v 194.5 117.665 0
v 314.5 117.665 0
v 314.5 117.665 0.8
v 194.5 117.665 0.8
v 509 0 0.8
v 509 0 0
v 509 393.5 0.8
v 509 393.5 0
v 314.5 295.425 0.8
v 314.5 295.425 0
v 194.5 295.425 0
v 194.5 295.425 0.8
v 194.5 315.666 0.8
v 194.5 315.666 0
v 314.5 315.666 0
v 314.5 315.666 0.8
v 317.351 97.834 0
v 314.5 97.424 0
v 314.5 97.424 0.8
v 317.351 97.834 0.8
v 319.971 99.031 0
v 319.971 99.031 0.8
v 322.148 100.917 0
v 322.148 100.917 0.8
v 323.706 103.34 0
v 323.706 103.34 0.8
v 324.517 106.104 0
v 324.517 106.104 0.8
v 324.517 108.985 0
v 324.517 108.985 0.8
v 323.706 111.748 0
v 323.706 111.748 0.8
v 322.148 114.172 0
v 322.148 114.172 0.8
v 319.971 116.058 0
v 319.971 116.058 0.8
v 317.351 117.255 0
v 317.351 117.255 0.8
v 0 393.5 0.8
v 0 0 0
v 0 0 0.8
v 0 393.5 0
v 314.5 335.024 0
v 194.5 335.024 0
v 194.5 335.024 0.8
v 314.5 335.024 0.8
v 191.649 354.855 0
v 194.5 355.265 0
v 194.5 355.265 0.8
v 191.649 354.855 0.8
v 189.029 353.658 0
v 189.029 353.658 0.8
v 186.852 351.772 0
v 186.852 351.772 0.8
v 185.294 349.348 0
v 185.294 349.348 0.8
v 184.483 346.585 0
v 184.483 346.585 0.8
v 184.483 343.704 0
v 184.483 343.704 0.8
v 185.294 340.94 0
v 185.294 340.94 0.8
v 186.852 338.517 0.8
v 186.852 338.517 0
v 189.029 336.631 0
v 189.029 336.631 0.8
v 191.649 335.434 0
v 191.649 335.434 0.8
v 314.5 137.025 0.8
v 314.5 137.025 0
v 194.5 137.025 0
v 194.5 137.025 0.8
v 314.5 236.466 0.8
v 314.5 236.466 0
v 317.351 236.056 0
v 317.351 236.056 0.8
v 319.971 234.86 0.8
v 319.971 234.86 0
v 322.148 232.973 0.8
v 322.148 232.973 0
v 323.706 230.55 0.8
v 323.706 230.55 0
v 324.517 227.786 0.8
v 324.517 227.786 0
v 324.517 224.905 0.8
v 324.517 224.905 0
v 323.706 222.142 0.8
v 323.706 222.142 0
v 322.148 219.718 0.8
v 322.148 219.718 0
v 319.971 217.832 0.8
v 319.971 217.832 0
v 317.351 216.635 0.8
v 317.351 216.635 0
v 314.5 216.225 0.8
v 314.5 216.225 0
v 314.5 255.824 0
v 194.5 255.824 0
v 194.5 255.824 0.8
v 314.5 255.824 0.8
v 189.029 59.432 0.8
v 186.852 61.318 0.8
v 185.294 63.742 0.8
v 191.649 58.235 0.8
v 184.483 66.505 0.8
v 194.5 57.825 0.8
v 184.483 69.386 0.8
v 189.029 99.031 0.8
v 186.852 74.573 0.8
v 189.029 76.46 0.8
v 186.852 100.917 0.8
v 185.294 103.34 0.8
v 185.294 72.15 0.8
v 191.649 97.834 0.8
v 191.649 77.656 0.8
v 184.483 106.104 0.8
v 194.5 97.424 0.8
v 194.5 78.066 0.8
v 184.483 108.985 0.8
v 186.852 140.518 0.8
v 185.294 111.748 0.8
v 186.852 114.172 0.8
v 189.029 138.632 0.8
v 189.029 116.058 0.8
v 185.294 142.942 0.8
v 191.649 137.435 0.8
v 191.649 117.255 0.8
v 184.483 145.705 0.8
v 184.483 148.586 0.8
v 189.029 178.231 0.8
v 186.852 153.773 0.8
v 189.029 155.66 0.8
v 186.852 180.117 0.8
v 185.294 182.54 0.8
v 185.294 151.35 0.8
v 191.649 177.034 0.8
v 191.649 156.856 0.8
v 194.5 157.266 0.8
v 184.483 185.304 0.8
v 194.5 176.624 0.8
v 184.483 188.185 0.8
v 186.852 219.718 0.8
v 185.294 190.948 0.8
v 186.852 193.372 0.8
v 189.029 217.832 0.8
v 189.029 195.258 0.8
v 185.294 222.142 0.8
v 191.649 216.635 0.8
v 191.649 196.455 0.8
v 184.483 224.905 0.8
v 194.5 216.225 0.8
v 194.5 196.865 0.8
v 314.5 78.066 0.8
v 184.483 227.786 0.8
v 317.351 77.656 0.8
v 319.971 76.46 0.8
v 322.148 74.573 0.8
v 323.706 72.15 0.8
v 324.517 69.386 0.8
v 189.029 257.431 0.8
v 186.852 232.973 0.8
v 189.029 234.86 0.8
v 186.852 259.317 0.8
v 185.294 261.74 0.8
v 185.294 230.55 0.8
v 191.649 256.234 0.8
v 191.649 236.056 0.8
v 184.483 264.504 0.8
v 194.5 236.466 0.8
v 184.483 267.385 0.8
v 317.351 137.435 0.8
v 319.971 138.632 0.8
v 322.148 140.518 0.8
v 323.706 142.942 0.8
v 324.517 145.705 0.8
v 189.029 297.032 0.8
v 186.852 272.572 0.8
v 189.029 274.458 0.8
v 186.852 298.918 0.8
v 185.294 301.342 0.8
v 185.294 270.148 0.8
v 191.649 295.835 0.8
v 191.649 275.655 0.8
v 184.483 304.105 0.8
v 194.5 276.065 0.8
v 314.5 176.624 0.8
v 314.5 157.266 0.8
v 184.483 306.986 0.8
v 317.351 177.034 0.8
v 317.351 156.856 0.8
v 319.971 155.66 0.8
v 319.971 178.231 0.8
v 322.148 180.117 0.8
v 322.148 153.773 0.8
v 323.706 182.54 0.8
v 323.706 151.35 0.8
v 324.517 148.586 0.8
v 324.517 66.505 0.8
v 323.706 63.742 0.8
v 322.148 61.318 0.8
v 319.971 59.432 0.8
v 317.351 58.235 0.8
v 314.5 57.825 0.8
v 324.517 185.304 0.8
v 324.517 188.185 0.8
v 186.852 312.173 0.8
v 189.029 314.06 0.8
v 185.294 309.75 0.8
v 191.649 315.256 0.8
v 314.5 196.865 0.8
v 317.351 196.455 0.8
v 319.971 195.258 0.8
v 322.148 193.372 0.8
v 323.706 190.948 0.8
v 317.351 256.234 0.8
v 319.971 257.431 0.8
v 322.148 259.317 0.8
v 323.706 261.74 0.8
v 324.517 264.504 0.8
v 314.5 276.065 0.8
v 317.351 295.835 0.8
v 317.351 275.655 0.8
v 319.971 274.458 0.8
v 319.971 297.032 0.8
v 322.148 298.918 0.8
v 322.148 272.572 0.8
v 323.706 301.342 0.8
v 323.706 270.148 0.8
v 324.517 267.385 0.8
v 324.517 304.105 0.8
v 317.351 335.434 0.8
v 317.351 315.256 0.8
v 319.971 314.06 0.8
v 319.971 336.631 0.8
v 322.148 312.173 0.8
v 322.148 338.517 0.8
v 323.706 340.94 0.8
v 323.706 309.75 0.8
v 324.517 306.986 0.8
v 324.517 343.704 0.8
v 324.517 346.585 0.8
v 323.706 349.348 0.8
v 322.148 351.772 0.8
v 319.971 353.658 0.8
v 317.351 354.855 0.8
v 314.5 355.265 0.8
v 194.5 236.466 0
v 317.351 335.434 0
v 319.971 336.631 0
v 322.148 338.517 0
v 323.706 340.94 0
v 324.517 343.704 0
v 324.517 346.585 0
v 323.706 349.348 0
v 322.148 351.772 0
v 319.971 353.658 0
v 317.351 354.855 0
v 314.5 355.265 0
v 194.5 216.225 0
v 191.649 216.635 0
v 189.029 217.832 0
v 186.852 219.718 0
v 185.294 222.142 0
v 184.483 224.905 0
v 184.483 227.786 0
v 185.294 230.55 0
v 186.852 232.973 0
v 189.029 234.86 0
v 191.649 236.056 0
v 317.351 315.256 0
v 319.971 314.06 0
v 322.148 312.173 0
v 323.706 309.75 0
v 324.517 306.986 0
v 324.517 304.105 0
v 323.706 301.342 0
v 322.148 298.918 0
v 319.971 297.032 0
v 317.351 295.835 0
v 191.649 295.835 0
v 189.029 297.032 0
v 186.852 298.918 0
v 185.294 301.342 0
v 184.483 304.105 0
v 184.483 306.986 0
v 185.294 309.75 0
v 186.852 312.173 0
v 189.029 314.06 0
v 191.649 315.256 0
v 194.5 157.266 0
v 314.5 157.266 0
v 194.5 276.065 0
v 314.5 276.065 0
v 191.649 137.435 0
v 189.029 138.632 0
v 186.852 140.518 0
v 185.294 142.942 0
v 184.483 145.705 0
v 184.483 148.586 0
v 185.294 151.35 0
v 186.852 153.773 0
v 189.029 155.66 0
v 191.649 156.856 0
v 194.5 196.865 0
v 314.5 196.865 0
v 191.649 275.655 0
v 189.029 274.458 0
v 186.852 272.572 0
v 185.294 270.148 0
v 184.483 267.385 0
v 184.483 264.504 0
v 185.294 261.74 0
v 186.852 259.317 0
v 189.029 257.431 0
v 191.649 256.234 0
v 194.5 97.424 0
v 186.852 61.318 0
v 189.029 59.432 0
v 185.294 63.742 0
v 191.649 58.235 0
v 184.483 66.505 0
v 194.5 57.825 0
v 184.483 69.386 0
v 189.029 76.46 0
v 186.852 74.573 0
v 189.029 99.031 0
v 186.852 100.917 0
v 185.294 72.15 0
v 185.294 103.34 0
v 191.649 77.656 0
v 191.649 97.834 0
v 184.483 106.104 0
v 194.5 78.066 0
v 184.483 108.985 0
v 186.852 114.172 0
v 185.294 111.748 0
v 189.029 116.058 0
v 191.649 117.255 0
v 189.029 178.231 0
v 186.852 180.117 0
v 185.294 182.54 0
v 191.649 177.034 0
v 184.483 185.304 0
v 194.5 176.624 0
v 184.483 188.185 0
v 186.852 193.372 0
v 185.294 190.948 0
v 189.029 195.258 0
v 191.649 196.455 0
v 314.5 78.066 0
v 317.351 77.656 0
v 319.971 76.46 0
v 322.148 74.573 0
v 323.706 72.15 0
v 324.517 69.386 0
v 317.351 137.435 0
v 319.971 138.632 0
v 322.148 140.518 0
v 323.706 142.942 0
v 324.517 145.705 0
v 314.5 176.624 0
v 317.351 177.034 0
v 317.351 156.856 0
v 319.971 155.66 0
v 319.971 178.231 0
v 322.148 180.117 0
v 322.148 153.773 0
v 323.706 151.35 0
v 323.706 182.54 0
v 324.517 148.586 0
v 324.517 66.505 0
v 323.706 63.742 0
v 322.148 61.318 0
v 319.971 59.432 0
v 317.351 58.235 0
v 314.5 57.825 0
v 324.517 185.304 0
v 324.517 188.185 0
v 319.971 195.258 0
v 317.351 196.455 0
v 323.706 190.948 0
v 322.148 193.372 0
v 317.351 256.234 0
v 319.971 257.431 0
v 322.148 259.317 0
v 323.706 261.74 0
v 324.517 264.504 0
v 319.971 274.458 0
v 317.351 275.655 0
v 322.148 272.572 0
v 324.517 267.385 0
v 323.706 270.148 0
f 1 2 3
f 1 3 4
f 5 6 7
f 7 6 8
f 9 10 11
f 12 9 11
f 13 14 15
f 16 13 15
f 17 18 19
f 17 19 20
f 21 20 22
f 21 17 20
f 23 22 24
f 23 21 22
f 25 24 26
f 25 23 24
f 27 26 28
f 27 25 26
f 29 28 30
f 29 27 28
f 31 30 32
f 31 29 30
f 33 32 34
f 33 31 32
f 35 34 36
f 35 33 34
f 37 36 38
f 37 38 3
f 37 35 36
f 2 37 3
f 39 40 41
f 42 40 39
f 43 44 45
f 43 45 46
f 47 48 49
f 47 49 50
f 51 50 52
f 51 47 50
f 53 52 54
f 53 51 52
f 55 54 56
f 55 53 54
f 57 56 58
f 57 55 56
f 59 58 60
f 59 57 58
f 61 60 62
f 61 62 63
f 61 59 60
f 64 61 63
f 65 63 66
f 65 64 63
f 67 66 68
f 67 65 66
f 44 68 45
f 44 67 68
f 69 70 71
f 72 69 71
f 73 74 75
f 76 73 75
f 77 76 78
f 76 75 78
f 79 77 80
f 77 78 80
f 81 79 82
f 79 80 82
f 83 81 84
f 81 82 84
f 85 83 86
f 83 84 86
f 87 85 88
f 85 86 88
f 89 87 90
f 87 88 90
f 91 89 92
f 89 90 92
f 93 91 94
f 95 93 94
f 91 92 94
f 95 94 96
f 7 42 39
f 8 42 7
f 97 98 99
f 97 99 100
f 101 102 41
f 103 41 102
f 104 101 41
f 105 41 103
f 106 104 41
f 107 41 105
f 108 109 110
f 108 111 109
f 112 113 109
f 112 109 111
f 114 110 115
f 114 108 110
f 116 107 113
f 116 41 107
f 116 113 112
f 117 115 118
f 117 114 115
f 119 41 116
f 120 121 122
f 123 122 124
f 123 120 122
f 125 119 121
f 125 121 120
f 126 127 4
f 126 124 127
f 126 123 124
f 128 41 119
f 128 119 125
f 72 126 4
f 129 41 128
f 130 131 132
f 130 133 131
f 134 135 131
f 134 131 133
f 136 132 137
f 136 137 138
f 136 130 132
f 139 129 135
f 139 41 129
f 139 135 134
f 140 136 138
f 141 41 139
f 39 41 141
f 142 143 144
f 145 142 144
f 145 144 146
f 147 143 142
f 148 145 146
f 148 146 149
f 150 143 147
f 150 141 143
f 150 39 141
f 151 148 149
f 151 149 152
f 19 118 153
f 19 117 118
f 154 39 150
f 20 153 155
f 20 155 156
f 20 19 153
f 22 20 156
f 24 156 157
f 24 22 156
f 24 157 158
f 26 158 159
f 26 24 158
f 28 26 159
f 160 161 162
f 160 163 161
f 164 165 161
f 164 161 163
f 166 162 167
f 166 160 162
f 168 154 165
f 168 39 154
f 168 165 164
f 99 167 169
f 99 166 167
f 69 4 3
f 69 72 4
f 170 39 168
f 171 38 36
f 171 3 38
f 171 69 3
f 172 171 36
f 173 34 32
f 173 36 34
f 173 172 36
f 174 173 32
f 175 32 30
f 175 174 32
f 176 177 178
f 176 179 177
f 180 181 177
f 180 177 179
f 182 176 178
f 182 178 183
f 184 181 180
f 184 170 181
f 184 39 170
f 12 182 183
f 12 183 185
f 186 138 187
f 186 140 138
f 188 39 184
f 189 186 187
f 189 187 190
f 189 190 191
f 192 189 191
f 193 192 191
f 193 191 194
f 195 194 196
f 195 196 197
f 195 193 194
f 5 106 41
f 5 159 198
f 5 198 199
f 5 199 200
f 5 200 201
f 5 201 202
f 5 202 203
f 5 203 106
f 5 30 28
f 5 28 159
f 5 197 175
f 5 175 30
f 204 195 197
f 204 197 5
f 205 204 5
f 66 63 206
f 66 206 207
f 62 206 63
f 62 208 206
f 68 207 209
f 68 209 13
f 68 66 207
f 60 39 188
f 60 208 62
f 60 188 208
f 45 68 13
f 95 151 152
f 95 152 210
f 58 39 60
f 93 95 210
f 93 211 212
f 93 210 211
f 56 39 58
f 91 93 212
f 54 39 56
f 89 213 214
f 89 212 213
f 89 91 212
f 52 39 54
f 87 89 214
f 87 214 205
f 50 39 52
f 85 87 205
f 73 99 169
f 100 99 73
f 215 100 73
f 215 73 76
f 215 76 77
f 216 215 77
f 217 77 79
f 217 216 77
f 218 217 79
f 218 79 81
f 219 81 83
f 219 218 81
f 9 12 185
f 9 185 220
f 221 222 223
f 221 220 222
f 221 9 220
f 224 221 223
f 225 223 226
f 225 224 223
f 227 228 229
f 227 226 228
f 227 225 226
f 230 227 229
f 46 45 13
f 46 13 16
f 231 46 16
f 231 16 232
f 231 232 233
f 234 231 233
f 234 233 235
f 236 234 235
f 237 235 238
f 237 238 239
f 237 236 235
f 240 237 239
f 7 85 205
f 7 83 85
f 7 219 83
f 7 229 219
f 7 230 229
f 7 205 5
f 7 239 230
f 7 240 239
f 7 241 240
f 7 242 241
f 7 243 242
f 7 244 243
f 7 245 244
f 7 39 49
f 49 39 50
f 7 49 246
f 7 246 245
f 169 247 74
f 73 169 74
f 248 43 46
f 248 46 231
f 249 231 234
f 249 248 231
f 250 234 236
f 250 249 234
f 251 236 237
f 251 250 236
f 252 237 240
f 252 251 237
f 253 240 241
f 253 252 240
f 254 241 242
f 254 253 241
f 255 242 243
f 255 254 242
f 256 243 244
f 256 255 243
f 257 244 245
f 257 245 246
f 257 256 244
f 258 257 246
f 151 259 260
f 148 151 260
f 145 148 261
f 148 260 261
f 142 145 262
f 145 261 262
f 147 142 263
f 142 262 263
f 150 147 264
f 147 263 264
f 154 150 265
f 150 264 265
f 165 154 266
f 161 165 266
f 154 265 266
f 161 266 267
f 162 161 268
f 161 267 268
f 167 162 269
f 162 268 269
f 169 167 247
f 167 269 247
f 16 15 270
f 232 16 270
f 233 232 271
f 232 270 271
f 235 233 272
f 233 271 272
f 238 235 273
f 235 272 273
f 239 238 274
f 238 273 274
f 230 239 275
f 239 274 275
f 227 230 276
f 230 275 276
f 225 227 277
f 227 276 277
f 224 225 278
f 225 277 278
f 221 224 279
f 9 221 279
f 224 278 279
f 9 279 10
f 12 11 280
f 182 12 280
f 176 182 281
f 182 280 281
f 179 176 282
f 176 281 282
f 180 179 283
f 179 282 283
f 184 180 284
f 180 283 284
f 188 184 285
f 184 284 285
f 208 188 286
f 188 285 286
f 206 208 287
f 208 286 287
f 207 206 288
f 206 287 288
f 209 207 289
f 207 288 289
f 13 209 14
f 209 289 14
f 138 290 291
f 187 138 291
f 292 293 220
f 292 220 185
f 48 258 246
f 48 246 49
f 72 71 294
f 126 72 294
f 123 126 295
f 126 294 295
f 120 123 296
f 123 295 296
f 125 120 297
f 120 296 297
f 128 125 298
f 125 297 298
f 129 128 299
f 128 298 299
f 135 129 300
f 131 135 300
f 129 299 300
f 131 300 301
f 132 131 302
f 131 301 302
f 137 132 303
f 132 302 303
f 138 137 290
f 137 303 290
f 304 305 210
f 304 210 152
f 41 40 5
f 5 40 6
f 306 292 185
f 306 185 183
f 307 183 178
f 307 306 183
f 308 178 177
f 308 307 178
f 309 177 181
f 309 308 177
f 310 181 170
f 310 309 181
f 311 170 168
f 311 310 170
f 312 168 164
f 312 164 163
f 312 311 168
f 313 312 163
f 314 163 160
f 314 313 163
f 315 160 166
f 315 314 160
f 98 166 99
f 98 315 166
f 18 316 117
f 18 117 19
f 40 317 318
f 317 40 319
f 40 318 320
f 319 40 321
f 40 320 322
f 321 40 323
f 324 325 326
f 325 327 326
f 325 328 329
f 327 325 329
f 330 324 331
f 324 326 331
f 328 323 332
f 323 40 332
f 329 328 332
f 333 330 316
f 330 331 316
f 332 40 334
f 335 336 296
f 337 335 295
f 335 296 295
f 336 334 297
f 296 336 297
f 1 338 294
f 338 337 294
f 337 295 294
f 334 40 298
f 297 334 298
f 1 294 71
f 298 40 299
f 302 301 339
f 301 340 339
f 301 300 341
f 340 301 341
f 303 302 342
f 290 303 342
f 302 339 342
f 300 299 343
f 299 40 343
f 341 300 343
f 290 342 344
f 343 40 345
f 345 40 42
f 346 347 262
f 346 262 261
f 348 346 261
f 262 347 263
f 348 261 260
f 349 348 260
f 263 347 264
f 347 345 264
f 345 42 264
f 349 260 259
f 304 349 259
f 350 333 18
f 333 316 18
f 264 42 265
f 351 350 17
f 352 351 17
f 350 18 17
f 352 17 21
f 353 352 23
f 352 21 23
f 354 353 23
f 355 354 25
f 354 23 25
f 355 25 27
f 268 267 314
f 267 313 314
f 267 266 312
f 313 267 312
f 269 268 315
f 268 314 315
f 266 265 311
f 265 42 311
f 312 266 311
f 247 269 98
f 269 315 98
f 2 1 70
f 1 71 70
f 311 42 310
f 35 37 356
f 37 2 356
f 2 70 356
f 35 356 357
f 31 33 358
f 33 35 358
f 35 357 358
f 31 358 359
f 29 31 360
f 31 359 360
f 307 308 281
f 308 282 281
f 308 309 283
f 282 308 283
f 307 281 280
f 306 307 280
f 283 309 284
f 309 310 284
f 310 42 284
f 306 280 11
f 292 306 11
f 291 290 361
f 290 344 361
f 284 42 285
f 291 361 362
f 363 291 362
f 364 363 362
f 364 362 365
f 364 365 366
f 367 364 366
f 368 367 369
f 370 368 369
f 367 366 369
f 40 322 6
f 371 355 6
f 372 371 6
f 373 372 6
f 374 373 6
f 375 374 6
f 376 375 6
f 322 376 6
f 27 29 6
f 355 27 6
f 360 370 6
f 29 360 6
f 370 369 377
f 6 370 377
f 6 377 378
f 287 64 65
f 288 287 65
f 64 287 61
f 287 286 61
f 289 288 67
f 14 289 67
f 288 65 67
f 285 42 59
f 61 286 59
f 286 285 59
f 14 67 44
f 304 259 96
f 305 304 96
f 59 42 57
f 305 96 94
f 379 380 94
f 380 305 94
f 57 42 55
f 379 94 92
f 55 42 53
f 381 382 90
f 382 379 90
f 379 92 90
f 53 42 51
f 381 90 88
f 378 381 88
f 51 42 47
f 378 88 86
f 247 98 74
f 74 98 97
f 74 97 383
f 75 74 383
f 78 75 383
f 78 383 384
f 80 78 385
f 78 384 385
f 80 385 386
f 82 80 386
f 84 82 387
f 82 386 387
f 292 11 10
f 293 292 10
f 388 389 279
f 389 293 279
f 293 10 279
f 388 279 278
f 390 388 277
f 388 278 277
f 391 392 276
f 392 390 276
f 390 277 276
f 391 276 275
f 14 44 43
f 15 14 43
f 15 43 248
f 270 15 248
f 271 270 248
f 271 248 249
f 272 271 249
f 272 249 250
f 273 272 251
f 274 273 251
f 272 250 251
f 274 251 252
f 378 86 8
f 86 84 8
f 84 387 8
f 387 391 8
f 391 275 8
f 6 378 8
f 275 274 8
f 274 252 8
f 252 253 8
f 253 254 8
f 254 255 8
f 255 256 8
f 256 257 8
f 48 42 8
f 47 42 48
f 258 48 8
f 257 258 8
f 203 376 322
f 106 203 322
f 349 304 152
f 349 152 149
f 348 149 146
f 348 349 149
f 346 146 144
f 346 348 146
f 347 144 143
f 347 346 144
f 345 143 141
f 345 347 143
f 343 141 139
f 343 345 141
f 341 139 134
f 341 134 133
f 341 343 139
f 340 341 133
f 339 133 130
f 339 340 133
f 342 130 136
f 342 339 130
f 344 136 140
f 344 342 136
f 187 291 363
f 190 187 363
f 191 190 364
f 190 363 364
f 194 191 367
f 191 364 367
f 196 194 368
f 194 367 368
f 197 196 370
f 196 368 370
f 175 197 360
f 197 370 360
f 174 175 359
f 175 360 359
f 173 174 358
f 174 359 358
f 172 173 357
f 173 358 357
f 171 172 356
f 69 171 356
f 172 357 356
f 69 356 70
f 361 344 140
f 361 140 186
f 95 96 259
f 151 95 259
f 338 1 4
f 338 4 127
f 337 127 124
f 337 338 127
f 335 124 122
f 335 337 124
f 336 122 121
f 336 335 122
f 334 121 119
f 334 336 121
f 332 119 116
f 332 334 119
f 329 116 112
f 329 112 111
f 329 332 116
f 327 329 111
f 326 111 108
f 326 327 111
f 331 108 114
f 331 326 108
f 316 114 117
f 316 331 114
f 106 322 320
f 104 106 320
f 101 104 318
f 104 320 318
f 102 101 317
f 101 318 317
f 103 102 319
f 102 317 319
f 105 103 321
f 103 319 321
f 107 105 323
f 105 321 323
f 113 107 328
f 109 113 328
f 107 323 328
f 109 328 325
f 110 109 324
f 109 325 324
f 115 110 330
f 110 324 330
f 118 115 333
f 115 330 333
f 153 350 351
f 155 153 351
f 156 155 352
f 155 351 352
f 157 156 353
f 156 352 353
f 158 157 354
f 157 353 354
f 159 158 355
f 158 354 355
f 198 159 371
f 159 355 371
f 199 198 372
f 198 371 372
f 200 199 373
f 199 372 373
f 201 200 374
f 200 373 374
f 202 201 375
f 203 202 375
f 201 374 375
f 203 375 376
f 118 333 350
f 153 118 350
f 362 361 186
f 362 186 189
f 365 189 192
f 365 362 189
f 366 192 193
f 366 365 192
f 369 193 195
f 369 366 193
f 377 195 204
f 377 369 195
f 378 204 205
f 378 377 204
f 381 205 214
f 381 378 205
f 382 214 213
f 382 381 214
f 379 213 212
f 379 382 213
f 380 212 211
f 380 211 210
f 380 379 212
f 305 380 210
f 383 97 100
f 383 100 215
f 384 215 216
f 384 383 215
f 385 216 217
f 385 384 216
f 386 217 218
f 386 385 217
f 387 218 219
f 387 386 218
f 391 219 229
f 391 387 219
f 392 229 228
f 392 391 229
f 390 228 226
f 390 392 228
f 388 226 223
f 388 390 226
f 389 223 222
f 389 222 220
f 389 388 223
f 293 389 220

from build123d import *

# Parameters (mm, degrees)
SKETCH1_W           = 509
SKETCH1_H           = 393.5
BOSS_EXTRUDE1_DEPTH = 0.8


with BuildPart() as part:
    # Sketch1 → Boss-Extrude1 (new body)
    with BuildSketch(Plane.XY):
        with Locations((254.5, 196.75)):
            Rectangle(SKETCH1_W, SKETCH1_H)
        with BuildLine():
            ThreePointArc((314.5, 97.423934246), (324.620369271, 107.544303517), (314.5, 117.664672788))
            Line((314.5, 117.664672788), (194.5, 117.664672788))
            ThreePointArc((194.5, 117.664672788), (184.379630729, 107.544303517), (194.5, 97.423934246))
            Line((194.5, 97.423934246), (314.5, 97.423934246))
        make_face(mode=Mode.SUBTRACT)
        with BuildLine():
            ThreePointArc((314.5, 176.623934246), (324.620369271, 186.744303517), (314.5, 196.864672788))
            Line((314.5, 196.864672788), (194.5, 196.864672788))
            ThreePointArc((194.5, 196.864672788), (184.379630729, 186.744303517), (194.5, 176.623934246))
            Line((194.5, 176.623934246), (314.5, 176.623934246))
        make_face(mode=Mode.SUBTRACT)
        with BuildLine():
            ThreePointArc((314.5, 255.823934246), (324.620369271, 265.944303517), (314.5, 276.064672788))
            Line((314.5, 276.064672788), (194.5, 276.064672788))
            ThreePointArc((194.5, 276.064672788), (184.379630729, 265.944303517), (194.5, 255.823934246))
            Line((194.5, 255.823934246), (314.5, 255.823934246))
        make_face(mode=Mode.SUBTRACT)
        with BuildLine():
            ThreePointArc((314.5, 335.023934246), (324.620369271, 345.144303517), (314.5, 355.264672788))
            Line((314.5, 355.264672788), (194.5, 355.264672788))
            ThreePointArc((194.5, 355.264672788), (184.379630729, 345.144303517), (194.5, 335.023934246))
            Line((194.5, 335.023934246), (314.5, 335.023934246))
        make_face(mode=Mode.SUBTRACT)
        with BuildLine():
            Line((194.5, 315.666123662), (314.5, 315.666123662))
            ThreePointArc((314.5, 315.666123662), (324.620369271, 305.545754391), (314.5, 295.42538512))
            Line((314.5, 295.42538512), (194.5, 295.42538512))
            ThreePointArc((194.5, 295.42538512), (184.379630729, 305.545754391), (194.5, 315.666123662))
        make_face(mode=Mode.SUBTRACT)
        with BuildLine():
            Line((194.5, 236.466123662), (314.5, 236.466123662))
            ThreePointArc((314.5, 236.466123662), (324.620369271, 226.345754391), (314.5, 216.22538512))
            Line((314.5, 216.22538512), (194.5, 216.22538512))
            ThreePointArc((194.5, 216.22538512), (184.379630729, 226.345754391), (194.5, 236.466123662))
        make_face(mode=Mode.SUBTRACT)
        with BuildLine():
            Line((194.5, 157.266123662), (314.5, 157.266123662))
            ThreePointArc((314.5, 157.266123662), (324.620369271, 147.145754391), (314.5, 137.02538512))
            Line((314.5, 137.02538512), (194.5, 137.02538512))
            ThreePointArc((194.5, 137.02538512), (184.379630729, 147.145754391), (194.5, 157.266123662))
        make_face(mode=Mode.SUBTRACT)
        with BuildLine():
            Line((194.5, 78.066123662), (314.5, 78.066123662))
            ThreePointArc((314.5, 78.066123662), (324.620369271, 67.945754391), (314.5, 57.82538512))
            Line((314.5, 57.82538512), (194.5, 57.82538512))
            ThreePointArc((194.5, 57.82538512), (184.379630729, 67.945754391), (194.5, 78.066123662))
        make_face(mode=Mode.SUBTRACT)
    extrude(amount=BOSS_EXTRUDE1_DEPTH)


solid = part.part
